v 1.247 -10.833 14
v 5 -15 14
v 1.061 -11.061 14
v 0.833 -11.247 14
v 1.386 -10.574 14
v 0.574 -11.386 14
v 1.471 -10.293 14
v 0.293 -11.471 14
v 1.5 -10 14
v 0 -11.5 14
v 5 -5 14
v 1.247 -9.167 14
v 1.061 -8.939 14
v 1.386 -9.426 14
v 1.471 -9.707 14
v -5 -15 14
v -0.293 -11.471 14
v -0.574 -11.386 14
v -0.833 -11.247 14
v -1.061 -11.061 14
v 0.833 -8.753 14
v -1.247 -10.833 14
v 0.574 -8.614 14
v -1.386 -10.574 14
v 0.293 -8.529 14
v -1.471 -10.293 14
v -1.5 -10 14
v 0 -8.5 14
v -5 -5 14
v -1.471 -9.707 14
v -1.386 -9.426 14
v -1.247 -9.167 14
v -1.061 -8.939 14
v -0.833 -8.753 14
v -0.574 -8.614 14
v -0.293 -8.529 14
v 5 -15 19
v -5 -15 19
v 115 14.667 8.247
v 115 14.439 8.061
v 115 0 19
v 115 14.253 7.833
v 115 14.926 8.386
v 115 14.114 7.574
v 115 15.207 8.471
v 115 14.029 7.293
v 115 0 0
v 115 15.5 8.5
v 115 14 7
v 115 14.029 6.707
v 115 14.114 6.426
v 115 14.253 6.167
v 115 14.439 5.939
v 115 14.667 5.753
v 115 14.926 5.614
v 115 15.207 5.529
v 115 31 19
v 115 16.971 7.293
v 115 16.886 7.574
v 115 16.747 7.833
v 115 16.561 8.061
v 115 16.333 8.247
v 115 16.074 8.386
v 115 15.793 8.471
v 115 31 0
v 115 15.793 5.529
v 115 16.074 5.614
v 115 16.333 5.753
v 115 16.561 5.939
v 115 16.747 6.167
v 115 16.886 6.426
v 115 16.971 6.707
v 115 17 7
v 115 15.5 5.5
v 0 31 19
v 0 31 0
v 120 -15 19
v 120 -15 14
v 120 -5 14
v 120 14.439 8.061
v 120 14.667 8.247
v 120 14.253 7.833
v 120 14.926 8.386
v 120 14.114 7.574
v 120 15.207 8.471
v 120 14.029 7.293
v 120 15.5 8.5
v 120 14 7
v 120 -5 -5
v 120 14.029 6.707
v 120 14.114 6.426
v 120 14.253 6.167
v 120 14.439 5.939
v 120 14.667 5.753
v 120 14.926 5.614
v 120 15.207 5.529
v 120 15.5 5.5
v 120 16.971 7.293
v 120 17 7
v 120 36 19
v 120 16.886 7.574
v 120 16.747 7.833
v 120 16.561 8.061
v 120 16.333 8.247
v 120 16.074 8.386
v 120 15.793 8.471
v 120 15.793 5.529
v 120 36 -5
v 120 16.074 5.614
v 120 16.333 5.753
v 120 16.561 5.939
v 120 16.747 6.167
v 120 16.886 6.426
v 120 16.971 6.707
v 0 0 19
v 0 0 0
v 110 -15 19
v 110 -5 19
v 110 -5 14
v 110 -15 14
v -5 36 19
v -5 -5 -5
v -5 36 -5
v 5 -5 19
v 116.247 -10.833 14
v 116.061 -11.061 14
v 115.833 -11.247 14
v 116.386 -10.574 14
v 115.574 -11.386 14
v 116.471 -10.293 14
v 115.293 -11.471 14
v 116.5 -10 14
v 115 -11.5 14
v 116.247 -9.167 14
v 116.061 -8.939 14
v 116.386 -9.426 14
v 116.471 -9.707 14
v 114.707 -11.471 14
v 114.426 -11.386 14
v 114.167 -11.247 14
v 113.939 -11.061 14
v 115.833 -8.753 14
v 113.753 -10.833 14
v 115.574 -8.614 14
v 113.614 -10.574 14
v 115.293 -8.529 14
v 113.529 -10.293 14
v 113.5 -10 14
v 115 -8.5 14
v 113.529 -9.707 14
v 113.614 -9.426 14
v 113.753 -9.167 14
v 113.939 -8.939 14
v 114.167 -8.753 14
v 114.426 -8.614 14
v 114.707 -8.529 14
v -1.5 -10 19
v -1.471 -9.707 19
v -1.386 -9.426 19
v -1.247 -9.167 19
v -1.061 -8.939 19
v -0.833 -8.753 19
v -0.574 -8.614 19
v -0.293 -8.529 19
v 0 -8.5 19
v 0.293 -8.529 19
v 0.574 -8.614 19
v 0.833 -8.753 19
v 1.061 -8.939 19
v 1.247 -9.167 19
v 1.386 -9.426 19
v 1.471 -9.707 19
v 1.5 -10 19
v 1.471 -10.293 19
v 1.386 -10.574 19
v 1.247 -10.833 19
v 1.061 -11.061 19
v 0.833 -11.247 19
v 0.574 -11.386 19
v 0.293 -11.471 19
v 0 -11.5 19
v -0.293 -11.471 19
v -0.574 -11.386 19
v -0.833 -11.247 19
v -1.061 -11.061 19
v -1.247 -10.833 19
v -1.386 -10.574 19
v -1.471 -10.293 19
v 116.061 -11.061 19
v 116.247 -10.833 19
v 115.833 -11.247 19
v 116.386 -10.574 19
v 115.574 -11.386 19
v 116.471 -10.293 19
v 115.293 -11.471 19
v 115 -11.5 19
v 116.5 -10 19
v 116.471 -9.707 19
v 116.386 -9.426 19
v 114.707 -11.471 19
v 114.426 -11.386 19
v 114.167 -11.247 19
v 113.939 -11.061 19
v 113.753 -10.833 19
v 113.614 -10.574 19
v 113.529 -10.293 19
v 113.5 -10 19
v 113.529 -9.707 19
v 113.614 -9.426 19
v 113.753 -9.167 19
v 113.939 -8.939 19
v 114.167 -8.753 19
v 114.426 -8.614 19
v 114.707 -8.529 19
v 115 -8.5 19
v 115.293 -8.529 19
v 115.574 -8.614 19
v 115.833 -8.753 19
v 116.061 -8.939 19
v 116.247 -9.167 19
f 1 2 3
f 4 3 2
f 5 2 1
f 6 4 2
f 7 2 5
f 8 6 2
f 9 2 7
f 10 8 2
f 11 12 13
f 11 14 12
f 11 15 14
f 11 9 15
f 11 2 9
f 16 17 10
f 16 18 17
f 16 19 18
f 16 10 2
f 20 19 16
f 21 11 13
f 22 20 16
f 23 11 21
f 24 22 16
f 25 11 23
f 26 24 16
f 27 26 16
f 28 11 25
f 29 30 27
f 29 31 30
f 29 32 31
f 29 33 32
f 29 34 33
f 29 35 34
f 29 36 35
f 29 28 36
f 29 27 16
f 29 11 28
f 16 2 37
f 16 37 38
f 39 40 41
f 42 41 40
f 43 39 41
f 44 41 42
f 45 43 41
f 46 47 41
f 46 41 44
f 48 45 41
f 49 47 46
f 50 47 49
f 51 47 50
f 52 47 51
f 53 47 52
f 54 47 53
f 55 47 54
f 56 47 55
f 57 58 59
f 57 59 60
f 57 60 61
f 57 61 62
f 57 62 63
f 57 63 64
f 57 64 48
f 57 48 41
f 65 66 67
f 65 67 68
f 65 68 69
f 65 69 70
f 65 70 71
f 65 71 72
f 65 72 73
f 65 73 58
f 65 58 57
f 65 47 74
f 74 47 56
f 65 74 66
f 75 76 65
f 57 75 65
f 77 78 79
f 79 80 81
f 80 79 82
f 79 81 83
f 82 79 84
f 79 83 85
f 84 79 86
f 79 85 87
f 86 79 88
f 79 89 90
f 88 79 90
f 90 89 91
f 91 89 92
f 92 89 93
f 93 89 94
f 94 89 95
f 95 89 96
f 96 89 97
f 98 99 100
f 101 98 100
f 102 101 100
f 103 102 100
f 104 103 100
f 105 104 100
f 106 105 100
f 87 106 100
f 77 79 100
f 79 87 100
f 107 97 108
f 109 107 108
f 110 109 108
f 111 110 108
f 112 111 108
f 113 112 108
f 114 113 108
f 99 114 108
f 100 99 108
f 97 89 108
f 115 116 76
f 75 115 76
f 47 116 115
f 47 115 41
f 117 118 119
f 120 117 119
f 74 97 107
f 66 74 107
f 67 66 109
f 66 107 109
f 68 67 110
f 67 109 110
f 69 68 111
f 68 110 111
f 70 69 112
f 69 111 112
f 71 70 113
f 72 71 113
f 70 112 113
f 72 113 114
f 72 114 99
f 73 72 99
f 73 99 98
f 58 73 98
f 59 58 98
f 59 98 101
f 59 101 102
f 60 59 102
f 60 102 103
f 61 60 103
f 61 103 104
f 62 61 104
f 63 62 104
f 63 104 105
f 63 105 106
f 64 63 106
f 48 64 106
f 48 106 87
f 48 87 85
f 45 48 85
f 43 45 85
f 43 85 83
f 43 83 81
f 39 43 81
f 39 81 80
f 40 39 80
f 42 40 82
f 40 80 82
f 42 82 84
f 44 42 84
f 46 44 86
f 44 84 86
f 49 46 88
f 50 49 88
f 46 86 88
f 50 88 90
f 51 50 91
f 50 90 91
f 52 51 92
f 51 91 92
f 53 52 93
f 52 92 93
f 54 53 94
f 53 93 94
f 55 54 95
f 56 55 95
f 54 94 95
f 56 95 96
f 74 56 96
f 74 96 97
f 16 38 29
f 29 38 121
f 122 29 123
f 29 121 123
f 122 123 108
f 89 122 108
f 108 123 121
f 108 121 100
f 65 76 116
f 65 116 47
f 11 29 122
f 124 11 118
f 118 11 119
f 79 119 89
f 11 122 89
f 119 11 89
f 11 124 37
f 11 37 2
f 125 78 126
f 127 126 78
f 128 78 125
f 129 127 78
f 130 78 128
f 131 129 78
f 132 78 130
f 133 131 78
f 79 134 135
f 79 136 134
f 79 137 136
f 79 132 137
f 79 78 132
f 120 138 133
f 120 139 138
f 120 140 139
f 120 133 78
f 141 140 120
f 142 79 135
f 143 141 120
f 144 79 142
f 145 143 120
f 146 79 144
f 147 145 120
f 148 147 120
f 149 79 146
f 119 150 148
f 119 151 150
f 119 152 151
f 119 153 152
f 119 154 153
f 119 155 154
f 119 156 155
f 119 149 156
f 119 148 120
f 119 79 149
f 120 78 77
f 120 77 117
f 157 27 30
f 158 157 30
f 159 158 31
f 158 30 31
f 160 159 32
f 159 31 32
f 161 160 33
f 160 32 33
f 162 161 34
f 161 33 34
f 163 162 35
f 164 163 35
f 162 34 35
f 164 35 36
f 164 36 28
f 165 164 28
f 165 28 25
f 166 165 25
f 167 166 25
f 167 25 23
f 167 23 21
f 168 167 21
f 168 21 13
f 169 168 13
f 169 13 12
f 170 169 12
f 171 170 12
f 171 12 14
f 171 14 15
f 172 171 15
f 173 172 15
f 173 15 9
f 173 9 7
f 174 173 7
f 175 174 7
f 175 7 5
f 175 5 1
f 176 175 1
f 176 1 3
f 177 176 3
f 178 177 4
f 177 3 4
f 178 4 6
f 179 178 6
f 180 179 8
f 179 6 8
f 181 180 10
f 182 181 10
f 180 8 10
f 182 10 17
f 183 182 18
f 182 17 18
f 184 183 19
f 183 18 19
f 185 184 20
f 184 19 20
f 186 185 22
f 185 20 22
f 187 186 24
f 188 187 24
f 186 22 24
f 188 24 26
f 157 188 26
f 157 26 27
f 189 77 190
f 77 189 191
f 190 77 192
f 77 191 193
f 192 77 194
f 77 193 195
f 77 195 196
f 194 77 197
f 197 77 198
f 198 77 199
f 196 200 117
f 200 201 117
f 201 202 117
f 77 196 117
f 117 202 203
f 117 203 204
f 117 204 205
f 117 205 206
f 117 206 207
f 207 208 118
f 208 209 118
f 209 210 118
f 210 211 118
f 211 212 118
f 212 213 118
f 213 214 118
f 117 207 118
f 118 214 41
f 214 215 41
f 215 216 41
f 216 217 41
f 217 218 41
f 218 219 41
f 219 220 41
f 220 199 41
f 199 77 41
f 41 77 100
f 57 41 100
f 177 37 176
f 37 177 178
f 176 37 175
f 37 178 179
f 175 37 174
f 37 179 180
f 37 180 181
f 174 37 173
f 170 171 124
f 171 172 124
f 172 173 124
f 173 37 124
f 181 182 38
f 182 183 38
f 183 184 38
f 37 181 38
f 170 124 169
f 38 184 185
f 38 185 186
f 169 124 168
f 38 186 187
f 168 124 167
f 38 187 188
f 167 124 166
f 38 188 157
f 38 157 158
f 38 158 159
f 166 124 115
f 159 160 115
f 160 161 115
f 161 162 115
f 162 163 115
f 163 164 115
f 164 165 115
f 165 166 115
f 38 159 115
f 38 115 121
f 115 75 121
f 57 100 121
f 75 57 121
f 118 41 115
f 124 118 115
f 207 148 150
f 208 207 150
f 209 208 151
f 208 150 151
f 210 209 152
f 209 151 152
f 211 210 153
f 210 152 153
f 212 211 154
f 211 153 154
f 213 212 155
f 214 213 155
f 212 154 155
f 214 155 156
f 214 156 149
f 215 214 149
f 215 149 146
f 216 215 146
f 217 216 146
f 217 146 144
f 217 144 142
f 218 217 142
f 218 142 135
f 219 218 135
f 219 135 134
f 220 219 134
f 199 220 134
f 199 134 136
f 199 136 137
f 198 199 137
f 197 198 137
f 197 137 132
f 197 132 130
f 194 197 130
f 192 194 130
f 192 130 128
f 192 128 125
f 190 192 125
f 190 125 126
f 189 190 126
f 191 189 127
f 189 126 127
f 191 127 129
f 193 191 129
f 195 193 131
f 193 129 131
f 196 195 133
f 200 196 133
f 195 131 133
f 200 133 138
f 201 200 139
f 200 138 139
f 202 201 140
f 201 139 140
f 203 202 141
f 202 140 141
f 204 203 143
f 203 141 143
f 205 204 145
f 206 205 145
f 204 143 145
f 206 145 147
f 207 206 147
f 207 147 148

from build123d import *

# Parameters (mm, degrees)
SKETCH1_W           = 115
SKETCH1_H           = 31
BOSS_EXTRUDE1_DEPTH = 19
SHELL1_T            = 5
SKETCH2_R           = 1.5
CUT_EXTRUDE1_DEPTH  = 19
SKETCH3_W           = 10
SKETCH3_H           = 5
BOSS_EXTRUDE2_DEPTH = 10
SKETCH4_R           = 1.5
CUT_EXTRUDE2_DEPTH  = 127.716218378


with BuildPart() as part:
    # Sketch1 → Boss-Extrude1 (new body)
    with BuildSketch(Plane.XY):
        with Locations((57.5, 15.5)):
            Rectangle(SKETCH1_W, SKETCH1_H)
    extrude(amount=BOSS_EXTRUDE1_DEPTH)

    # Shell1
    shell1_openings = [part.faces().sort_by_distance(p)[0] for p in [
        (57.5, 15.5, 19),
    ]]
    offset(amount=SHELL1_T, openings=shell1_openings, kind=Kind.INTERSECTION)

    # Sketch2 → Cut-Extrude1 (cut)
    with BuildSketch(Plane(origin=(120, 0, 0), x_dir=(0, 0, -1), z_dir=(1, 0, 0))):
        with Locations((-7, 15.5)):
            Circle(SKETCH2_R)
    extrude(amount=-CUT_EXTRUDE1_DEPTH, mode=Mode.SUBTRACT)

    # Sketch3 → Boss-Extrude2 (add)
    with BuildSketch(Plane(origin=(0, -5, 0), x_dir=(-1, 0, 0), z_dir=(0, -1, 0))):
        with Locations((0, -16.5)):
            Rectangle(SKETCH3_W, SKETCH3_H)
        with Locations((-115, -16.5)):
            Rectangle(SKETCH3_W, SKETCH3_H)
    extrude(amount=BOSS_EXTRUDE2_DEPTH)

    # Sketch4 → Cut-Extrude2 (cut, through all)
    with BuildSketch(Plane(origin=(0, 0, 14), x_dir=(-1, 0, 0), z_dir=(0, 0, -1))):
        with Locations((0, -10)):
            Circle(SKETCH4_R)
        with Locations((-115, -10)):
            Circle(SKETCH4_R)
    extrude(amount=-CUT_EXTRUDE2_DEPTH, mode=Mode.SUBTRACT)


solid = part.part
